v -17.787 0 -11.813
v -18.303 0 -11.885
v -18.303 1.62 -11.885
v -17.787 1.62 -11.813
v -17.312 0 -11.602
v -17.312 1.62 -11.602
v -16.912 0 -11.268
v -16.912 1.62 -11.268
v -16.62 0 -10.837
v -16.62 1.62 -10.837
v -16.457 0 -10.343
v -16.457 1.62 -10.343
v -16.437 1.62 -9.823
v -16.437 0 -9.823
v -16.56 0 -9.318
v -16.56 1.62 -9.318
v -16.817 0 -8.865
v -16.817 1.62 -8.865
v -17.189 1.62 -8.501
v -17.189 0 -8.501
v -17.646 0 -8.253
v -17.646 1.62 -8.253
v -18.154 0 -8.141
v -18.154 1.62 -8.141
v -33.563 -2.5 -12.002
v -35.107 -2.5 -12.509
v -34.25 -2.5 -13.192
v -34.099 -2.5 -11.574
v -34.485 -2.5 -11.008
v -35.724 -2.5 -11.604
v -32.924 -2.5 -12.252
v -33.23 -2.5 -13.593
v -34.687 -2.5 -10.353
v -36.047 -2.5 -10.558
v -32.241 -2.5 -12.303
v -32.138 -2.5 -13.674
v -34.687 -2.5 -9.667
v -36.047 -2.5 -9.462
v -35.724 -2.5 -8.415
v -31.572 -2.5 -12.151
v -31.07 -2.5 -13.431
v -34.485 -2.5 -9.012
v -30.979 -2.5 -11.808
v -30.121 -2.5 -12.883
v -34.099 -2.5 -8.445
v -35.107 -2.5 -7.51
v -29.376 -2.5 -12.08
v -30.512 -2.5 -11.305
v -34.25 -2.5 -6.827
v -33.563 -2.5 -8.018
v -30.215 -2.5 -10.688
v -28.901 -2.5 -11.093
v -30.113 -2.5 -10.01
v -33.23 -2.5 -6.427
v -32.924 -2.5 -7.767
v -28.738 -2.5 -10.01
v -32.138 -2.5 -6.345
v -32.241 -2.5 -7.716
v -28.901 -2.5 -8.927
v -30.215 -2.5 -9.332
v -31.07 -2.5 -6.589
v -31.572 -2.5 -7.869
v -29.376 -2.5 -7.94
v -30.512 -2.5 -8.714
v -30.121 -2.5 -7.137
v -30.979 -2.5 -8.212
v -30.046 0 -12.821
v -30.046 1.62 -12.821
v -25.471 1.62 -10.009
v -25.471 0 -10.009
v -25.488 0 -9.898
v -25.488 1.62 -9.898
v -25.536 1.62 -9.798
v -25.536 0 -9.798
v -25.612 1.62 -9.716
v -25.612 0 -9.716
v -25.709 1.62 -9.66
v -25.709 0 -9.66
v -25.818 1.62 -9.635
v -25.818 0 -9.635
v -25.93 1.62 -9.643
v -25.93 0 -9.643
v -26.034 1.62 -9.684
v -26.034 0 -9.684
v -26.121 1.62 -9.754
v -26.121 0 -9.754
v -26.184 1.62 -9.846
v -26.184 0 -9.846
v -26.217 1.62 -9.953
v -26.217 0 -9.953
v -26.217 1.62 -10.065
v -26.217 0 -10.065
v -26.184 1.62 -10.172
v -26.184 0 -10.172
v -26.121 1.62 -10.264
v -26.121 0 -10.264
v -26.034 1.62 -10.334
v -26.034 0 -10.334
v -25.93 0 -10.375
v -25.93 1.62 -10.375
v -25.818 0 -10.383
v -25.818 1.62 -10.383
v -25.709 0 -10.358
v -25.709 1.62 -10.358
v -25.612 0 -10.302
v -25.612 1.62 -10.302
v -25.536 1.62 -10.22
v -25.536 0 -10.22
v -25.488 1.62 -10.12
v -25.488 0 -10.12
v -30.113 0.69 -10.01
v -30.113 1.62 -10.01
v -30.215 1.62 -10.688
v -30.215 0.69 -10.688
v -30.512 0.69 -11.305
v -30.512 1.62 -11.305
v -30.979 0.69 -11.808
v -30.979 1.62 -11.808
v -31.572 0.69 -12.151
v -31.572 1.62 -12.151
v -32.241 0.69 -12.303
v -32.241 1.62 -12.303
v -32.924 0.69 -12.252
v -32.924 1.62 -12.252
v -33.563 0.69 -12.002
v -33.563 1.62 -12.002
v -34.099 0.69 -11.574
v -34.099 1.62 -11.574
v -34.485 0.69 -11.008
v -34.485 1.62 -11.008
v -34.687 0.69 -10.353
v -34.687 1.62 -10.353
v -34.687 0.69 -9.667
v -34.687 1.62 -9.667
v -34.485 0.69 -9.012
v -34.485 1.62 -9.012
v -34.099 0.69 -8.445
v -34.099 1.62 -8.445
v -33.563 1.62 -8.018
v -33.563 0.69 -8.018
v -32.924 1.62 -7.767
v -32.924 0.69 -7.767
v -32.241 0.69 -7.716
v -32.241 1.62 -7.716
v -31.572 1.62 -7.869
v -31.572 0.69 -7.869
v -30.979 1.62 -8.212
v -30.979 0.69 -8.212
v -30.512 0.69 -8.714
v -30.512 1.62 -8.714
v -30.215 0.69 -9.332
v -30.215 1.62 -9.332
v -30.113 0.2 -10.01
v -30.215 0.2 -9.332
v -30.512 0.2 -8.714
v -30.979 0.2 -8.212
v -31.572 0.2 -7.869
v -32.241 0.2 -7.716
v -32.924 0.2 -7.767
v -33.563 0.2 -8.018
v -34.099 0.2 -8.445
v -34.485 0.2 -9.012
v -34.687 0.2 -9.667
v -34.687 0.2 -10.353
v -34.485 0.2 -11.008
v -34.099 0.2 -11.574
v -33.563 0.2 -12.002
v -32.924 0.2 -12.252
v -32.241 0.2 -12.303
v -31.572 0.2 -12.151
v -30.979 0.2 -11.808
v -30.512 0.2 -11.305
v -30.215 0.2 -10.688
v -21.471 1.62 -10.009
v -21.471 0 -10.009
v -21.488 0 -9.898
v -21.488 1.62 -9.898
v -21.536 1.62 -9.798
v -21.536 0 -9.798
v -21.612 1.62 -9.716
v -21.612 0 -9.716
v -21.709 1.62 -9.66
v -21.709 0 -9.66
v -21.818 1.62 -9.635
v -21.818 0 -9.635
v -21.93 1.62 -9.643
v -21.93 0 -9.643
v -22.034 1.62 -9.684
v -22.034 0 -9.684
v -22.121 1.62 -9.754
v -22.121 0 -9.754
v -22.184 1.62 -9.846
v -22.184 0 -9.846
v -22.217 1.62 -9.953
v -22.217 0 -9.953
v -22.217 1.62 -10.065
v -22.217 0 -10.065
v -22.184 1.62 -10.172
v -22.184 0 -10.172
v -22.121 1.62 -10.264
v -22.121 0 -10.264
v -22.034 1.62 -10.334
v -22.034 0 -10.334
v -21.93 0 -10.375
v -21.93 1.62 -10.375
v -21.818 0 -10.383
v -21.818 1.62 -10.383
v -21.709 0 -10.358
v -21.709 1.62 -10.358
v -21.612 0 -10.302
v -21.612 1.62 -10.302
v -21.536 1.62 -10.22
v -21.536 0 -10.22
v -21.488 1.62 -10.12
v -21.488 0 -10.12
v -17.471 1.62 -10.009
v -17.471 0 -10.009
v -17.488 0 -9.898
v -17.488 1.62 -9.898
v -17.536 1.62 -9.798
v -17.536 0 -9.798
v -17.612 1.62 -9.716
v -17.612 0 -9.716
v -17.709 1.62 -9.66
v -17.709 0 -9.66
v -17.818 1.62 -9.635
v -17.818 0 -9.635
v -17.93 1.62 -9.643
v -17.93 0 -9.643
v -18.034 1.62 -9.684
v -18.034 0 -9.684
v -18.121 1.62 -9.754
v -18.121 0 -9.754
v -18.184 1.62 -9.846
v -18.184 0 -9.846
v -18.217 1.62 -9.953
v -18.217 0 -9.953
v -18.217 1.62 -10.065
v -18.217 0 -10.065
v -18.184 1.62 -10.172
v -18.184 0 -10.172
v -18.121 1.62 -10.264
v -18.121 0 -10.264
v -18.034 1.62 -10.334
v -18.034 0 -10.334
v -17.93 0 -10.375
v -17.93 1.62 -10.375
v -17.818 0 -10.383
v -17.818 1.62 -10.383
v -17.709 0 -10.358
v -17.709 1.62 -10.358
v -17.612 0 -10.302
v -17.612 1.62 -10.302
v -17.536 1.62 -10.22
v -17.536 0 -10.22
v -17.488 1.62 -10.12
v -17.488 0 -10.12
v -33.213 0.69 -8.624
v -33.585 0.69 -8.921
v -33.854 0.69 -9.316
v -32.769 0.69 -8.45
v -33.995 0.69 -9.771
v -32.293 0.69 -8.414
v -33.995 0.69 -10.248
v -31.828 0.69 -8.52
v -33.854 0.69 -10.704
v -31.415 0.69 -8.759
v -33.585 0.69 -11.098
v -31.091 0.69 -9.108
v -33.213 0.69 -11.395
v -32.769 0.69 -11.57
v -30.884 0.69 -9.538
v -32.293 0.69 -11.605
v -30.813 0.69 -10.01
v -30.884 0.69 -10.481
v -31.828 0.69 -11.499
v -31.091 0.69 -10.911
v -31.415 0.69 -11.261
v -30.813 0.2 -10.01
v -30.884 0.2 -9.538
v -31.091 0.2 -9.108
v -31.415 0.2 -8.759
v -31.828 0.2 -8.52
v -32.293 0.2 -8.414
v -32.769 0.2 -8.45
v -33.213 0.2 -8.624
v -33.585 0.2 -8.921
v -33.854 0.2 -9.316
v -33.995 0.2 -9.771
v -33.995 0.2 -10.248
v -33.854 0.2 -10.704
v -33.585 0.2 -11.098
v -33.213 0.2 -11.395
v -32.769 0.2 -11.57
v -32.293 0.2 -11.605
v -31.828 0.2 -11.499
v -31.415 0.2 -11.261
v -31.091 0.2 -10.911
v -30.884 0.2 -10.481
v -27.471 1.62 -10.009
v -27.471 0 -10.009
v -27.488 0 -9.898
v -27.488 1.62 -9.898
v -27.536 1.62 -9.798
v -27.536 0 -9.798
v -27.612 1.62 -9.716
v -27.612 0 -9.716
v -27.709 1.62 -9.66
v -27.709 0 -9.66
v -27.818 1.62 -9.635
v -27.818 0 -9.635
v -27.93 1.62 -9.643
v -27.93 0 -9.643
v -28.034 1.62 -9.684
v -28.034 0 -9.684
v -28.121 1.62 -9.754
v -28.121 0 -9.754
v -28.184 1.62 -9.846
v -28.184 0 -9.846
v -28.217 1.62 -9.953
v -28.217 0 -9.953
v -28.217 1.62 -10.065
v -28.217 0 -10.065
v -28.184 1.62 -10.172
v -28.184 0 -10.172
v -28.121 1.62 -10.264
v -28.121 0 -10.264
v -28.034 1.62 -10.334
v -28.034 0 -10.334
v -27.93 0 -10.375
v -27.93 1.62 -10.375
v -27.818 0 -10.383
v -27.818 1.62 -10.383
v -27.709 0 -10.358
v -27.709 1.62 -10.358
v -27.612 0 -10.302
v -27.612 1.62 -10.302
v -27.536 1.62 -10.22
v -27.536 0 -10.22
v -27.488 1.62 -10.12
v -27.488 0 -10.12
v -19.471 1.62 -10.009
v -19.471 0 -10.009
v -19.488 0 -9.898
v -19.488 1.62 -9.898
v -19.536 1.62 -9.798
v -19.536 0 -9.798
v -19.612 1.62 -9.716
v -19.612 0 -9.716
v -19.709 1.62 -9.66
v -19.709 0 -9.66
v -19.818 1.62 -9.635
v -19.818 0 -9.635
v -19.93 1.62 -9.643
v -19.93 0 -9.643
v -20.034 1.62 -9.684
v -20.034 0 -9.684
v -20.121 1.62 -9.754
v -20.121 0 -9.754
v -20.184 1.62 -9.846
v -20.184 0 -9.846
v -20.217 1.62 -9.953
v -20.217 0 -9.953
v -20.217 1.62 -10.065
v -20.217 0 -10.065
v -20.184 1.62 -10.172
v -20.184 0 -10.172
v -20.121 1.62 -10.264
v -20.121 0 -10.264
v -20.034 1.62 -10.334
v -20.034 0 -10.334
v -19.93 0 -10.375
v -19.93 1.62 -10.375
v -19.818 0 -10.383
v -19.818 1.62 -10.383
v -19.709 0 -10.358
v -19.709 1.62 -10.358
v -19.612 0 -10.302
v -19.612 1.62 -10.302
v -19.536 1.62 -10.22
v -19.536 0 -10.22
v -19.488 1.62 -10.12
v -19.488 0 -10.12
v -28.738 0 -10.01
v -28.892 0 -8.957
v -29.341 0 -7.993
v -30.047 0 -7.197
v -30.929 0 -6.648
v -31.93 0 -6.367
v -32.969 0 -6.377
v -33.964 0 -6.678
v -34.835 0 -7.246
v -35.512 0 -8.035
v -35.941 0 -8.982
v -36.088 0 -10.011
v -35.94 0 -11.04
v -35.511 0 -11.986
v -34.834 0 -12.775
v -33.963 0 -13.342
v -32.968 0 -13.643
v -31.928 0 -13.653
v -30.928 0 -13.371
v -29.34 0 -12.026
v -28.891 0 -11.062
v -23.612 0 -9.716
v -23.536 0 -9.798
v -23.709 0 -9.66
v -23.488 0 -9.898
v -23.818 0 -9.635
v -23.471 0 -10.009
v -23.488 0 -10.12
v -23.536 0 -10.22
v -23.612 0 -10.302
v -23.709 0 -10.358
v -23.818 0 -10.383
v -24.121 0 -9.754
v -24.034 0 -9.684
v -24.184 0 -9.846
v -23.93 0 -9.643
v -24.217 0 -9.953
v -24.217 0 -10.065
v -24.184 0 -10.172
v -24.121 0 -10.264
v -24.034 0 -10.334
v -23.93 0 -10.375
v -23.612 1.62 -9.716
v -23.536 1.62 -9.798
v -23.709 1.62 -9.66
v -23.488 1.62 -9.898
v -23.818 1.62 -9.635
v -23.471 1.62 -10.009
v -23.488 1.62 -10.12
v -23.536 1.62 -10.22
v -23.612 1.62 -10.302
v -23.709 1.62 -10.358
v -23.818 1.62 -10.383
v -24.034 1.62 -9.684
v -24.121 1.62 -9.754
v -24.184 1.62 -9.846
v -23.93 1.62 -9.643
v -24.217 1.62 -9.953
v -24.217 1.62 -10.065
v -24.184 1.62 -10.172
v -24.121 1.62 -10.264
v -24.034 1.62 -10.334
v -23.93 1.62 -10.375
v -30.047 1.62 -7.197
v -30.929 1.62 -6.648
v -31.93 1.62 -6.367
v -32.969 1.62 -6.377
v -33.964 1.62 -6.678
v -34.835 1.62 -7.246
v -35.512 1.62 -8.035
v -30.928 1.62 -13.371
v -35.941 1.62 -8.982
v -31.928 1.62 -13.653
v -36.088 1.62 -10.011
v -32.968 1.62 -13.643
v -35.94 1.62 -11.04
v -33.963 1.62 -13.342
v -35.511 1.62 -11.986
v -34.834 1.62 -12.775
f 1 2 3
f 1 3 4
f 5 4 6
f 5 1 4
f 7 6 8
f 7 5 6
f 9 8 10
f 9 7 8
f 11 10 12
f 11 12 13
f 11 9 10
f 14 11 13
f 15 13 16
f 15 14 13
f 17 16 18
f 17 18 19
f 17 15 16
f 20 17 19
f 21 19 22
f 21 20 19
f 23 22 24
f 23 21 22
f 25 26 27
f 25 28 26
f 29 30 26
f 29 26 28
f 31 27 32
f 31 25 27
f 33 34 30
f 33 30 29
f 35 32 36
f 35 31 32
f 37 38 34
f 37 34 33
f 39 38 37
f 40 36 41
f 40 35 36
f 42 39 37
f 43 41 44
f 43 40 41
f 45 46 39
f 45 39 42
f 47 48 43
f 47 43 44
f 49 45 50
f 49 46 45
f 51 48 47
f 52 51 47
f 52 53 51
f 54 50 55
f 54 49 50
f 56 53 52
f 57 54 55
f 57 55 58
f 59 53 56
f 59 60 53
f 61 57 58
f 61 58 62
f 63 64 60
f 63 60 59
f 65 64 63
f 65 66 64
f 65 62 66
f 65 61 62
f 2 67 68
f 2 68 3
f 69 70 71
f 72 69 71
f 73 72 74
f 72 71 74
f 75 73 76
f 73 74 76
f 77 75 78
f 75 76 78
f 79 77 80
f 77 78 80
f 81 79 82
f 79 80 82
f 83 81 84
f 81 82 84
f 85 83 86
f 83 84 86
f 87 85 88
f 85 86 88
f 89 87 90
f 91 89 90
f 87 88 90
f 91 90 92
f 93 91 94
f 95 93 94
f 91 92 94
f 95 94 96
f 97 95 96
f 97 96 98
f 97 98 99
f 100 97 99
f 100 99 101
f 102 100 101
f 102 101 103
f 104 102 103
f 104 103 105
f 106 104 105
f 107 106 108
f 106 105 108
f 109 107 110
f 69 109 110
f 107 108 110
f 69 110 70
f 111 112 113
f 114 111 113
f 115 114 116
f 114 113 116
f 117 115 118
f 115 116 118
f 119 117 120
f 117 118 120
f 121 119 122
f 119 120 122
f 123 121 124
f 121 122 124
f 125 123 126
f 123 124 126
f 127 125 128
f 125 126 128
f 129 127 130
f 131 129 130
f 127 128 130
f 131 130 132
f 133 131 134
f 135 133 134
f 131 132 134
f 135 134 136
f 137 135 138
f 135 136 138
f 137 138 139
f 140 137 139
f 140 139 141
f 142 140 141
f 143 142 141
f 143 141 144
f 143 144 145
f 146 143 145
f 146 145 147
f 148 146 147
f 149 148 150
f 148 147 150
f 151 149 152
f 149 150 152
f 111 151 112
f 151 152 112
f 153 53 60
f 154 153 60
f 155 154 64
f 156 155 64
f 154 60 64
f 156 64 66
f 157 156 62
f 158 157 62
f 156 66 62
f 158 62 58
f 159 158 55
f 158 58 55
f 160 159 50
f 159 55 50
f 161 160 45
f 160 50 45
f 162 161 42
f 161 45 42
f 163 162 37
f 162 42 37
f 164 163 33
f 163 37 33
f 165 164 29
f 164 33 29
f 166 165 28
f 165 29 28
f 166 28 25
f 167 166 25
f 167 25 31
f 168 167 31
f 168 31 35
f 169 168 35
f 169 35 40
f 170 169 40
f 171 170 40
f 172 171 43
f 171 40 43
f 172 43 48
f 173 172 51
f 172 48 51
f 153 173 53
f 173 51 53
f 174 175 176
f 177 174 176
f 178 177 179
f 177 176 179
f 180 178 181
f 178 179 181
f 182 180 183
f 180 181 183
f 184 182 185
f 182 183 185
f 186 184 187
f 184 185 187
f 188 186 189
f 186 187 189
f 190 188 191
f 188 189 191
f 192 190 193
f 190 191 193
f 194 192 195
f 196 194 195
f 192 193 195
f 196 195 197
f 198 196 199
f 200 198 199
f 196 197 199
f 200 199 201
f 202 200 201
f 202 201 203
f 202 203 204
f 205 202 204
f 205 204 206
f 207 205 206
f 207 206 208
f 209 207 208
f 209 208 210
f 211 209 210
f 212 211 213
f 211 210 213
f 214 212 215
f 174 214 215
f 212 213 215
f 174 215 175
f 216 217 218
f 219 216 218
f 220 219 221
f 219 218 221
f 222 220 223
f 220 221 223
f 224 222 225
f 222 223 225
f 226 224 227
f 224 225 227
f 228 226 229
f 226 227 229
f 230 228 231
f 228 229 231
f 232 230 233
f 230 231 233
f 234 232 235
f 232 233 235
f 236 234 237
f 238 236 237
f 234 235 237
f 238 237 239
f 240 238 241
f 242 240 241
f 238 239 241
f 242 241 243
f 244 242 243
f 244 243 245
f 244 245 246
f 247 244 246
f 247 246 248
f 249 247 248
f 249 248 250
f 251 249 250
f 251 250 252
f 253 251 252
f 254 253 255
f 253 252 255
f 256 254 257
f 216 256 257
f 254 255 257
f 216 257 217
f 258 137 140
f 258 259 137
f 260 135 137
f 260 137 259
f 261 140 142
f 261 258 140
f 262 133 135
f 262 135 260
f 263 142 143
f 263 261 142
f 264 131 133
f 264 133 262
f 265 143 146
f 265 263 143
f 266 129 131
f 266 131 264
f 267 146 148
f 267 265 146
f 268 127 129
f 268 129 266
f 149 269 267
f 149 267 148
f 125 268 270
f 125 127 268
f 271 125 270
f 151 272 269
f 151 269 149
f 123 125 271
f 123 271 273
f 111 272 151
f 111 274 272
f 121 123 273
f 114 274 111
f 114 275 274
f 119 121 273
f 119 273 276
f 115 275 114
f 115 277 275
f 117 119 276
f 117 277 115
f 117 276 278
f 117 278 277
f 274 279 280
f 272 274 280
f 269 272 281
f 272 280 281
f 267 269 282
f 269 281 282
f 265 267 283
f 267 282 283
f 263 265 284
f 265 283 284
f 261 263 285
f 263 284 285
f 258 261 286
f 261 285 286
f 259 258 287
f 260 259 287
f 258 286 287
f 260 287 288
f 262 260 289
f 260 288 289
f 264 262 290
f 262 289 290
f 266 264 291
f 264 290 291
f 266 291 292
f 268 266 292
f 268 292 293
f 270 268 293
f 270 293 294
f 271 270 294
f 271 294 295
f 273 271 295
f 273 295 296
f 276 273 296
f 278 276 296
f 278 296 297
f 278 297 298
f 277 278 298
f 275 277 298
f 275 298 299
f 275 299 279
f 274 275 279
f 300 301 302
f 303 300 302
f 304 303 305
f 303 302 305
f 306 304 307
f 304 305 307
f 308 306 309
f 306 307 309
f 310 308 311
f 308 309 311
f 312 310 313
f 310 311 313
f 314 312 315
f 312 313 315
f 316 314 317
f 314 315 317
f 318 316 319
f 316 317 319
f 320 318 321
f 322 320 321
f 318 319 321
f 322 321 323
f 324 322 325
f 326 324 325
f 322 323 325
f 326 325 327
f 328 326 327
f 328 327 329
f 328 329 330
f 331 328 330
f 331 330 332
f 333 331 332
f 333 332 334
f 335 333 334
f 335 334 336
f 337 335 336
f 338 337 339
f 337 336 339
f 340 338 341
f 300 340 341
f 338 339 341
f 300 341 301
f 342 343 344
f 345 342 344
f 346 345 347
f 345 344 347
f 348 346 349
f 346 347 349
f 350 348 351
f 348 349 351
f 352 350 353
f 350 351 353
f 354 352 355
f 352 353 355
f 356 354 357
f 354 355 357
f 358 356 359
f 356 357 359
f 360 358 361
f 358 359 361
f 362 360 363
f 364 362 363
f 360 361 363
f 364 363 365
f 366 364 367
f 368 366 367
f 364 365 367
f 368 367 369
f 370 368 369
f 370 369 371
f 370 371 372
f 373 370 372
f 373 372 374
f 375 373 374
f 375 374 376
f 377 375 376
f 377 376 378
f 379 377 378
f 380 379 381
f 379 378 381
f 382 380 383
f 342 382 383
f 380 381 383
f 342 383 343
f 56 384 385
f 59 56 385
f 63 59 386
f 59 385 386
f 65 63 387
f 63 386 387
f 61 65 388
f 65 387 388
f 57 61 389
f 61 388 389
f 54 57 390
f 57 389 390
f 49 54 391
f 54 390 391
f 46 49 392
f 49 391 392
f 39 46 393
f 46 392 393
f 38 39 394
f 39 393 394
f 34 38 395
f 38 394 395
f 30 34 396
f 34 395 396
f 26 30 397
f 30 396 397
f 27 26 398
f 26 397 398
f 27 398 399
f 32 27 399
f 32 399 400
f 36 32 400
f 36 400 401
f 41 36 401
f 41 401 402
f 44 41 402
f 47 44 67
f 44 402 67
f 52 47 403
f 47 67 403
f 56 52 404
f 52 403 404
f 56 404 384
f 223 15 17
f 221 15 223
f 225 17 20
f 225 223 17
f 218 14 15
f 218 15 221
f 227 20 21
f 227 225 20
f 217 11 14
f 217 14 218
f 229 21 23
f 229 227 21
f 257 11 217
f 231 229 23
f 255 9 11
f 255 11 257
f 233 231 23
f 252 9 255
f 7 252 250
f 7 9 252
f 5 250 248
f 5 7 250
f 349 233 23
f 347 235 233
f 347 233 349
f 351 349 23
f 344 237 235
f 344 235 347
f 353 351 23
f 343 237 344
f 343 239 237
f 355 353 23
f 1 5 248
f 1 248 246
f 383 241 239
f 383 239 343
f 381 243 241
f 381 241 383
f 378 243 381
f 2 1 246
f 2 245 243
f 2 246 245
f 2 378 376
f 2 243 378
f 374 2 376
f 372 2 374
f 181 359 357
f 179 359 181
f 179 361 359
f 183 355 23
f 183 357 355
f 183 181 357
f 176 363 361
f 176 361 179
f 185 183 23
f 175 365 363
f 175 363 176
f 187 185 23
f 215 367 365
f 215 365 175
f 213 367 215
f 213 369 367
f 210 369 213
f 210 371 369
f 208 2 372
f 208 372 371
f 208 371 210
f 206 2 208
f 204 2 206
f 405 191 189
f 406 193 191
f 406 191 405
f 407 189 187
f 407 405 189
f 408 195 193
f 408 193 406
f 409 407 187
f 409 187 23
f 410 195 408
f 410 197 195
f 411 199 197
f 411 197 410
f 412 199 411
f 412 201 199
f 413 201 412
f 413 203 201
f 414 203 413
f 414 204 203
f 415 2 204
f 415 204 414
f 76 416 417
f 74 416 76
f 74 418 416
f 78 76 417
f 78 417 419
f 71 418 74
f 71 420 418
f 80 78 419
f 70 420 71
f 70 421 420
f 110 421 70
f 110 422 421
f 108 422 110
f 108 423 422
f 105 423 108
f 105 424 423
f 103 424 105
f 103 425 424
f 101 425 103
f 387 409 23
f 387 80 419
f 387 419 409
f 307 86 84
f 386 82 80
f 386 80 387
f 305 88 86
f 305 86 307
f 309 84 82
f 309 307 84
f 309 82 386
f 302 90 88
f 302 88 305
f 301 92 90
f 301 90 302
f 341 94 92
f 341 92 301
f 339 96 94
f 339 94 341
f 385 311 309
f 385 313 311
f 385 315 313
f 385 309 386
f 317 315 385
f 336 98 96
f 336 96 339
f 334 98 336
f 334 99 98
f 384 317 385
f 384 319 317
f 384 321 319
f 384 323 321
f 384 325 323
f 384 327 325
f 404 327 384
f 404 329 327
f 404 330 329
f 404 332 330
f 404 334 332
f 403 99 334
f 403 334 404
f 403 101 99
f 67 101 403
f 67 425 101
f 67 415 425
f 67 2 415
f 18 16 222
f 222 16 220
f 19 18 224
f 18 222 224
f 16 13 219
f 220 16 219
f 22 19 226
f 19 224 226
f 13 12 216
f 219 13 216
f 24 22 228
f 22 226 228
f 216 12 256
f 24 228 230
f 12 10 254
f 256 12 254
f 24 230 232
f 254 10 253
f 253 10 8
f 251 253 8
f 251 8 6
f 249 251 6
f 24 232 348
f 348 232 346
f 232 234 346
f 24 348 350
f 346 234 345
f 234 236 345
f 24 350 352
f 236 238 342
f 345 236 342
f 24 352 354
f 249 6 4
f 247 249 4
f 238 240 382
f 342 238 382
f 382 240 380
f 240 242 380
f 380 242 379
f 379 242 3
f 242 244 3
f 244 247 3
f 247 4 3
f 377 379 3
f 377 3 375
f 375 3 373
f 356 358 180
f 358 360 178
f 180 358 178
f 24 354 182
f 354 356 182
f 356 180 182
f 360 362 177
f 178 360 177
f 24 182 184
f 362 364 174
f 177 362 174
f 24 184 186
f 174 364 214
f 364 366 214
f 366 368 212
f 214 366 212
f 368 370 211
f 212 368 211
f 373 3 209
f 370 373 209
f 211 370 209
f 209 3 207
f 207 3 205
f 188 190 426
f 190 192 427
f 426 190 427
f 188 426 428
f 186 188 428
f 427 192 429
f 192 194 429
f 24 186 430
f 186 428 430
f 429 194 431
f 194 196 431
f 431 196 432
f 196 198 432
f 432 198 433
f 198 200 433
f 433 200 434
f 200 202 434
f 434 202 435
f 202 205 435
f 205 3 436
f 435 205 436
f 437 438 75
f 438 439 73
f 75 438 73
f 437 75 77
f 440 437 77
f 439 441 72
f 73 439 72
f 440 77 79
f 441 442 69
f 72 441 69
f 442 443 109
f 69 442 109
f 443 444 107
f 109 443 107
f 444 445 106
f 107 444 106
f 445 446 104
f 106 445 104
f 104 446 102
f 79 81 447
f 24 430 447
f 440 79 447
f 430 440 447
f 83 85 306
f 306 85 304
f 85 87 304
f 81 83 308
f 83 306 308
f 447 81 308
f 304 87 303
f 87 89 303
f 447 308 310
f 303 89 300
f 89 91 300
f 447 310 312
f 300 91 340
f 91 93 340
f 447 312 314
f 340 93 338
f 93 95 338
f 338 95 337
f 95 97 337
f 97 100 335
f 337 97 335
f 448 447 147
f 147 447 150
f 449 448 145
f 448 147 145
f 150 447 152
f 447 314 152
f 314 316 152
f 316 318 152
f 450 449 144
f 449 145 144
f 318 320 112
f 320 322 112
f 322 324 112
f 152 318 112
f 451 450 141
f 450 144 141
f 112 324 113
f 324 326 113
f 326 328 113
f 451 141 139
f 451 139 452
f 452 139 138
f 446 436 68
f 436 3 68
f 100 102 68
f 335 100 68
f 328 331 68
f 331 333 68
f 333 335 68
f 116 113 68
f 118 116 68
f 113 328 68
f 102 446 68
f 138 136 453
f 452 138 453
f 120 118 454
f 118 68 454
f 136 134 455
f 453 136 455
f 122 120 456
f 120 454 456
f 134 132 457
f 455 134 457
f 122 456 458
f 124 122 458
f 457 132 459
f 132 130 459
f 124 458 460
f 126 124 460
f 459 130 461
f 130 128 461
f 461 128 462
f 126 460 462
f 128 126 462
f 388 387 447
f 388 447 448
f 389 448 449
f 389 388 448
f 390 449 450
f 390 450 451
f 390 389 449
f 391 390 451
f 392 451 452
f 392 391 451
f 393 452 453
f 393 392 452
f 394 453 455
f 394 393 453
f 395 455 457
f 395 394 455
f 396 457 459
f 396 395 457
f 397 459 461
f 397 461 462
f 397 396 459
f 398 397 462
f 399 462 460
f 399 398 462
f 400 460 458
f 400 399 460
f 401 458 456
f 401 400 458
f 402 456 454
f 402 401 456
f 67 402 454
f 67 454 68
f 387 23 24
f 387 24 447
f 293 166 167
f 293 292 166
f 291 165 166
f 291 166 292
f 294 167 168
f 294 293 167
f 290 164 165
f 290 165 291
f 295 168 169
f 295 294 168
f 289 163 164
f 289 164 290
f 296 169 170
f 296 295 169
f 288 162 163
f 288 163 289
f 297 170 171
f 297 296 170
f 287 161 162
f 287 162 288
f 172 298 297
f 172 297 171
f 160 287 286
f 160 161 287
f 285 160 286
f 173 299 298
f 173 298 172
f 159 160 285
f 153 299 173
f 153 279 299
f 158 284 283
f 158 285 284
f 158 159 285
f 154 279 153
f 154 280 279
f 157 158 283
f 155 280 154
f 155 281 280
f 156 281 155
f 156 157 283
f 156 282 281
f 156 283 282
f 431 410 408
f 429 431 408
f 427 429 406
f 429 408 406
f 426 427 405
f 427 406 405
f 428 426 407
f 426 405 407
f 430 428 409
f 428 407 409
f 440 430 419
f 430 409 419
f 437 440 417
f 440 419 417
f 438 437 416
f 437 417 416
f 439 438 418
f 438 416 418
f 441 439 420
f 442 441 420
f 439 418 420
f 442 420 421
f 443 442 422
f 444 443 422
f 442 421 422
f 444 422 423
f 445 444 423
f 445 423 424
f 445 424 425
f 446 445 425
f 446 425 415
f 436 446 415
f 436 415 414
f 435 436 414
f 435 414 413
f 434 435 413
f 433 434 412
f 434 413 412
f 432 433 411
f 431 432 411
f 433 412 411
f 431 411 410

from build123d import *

# Parameters (mm, degrees)
BOSS_EXTRUDE1_DEPTH = 1.62
SKETCH2_R           = 3.675
BOSS_EXTRUDE2_DEPTH = 2.5
SKETCH3_R           = 2.3
SKETCH3_R_2         = 1.6
CUT_EXTRUDE1_DEPTH  = 2.7
SKETCH4_R           = 1.6
CUT_EXTRUDE2_DEPTH  = 4.12
SKETCH5_R           = 2.3
CUT_EXTRUDE3_DEPTH  = 0.93
SKETCH7_R           = 0.375
CUT_EXTRUDE4_DEPTH  = 1.62


with BuildPart() as part:
    # Sketch1 → Boss-Extrude1 (new body)
    with BuildSketch(Plane(origin=(0, 0, 0), x_dir=(1, 0, 0), z_dir=(0, 1, 0))):
        with BuildLine():
            Line((-30.04567513, 12.821055753), (-18.302594635, 11.884771872))
            ThreePointArc((-18.302594635, 11.884771872), (-16.429062652, 10.083953465), (-18.15434761, 8.140641642))
            Line((-18.15434761, 8.140641642), (-30.046970978, 7.197397481))
            ThreePointArc((-30.046970978, 7.197397481), (-36.087594537, 10.010618695), (-30.04567513, 12.821055753))
        make_face()
    extrude(amount=BOSS_EXTRUDE1_DEPTH)

    # Sketch2 → Boss-Extrude2 (add)
    with BuildSketch(Plane.XZ):
        with Locations((-32.412594635, -10.009771872)):
            Circle(SKETCH2_R)
    extrude(amount=BOSS_EXTRUDE2_DEPTH)

    # Sketch3 → Cut-Extrude1 (cut)
    with BuildSketch(Plane.XZ.offset(2.5)):
        with Locations((-32.412594635, -10.009771872)):
            Circle(SKETCH3_R)
        with Locations((-32.412594635, -10.009771872)):
            Circle(SKETCH3_R_2, mode=Mode.SUBTRACT)
    extrude(amount=-CUT_EXTRUDE1_DEPTH, mode=Mode.SUBTRACT)

    # Sketch4 → Cut-Extrude2 (cut)
    with BuildSketch(Plane.XZ.offset(2.5)):
        with Locations((-32.412594635, -10.009771872)):
            Circle(SKETCH4_R)
    extrude(amount=-CUT_EXTRUDE2_DEPTH, mode=Mode.SUBTRACT)

    # Sketch5 → Cut-Extrude3 (cut)
    with BuildSketch(Plane(origin=(0, 1.62, 0), x_dir=(1, 0, 0), z_dir=(0, 1, 0))):
        with Locations((-32.412594635, 10.009771872)):
            Circle(SKETCH5_R)
    extrude(amount=-CUT_EXTRUDE3_DEPTH, mode=Mode.SUBTRACT)

    # Sketch7 → Cut-Extrude4 (cut)
    with BuildSketch(Plane.XZ):
        with Locations((-27.846278089, -10.008997382)):
            Circle(SKETCH7_R)
        with Locations((-25.846278089, -10.008997382)):
            Circle(SKETCH7_R)
        with Locations((-23.846278089, -10.008997382)):
            Circle(SKETCH7_R)
        with Locations((-21.846278089, -10.008997382)):
            Circle(SKETCH7_R)
        with Locations((-19.846278089, -10.008997382)):
            Circle(SKETCH7_R)
        with Locations((-17.846278089, -10.008997382)):
            Circle(SKETCH7_R)
    extrude(amount=-CUT_EXTRUDE4_DEPTH, mode=Mode.SUBTRACT)


solid = part.part
